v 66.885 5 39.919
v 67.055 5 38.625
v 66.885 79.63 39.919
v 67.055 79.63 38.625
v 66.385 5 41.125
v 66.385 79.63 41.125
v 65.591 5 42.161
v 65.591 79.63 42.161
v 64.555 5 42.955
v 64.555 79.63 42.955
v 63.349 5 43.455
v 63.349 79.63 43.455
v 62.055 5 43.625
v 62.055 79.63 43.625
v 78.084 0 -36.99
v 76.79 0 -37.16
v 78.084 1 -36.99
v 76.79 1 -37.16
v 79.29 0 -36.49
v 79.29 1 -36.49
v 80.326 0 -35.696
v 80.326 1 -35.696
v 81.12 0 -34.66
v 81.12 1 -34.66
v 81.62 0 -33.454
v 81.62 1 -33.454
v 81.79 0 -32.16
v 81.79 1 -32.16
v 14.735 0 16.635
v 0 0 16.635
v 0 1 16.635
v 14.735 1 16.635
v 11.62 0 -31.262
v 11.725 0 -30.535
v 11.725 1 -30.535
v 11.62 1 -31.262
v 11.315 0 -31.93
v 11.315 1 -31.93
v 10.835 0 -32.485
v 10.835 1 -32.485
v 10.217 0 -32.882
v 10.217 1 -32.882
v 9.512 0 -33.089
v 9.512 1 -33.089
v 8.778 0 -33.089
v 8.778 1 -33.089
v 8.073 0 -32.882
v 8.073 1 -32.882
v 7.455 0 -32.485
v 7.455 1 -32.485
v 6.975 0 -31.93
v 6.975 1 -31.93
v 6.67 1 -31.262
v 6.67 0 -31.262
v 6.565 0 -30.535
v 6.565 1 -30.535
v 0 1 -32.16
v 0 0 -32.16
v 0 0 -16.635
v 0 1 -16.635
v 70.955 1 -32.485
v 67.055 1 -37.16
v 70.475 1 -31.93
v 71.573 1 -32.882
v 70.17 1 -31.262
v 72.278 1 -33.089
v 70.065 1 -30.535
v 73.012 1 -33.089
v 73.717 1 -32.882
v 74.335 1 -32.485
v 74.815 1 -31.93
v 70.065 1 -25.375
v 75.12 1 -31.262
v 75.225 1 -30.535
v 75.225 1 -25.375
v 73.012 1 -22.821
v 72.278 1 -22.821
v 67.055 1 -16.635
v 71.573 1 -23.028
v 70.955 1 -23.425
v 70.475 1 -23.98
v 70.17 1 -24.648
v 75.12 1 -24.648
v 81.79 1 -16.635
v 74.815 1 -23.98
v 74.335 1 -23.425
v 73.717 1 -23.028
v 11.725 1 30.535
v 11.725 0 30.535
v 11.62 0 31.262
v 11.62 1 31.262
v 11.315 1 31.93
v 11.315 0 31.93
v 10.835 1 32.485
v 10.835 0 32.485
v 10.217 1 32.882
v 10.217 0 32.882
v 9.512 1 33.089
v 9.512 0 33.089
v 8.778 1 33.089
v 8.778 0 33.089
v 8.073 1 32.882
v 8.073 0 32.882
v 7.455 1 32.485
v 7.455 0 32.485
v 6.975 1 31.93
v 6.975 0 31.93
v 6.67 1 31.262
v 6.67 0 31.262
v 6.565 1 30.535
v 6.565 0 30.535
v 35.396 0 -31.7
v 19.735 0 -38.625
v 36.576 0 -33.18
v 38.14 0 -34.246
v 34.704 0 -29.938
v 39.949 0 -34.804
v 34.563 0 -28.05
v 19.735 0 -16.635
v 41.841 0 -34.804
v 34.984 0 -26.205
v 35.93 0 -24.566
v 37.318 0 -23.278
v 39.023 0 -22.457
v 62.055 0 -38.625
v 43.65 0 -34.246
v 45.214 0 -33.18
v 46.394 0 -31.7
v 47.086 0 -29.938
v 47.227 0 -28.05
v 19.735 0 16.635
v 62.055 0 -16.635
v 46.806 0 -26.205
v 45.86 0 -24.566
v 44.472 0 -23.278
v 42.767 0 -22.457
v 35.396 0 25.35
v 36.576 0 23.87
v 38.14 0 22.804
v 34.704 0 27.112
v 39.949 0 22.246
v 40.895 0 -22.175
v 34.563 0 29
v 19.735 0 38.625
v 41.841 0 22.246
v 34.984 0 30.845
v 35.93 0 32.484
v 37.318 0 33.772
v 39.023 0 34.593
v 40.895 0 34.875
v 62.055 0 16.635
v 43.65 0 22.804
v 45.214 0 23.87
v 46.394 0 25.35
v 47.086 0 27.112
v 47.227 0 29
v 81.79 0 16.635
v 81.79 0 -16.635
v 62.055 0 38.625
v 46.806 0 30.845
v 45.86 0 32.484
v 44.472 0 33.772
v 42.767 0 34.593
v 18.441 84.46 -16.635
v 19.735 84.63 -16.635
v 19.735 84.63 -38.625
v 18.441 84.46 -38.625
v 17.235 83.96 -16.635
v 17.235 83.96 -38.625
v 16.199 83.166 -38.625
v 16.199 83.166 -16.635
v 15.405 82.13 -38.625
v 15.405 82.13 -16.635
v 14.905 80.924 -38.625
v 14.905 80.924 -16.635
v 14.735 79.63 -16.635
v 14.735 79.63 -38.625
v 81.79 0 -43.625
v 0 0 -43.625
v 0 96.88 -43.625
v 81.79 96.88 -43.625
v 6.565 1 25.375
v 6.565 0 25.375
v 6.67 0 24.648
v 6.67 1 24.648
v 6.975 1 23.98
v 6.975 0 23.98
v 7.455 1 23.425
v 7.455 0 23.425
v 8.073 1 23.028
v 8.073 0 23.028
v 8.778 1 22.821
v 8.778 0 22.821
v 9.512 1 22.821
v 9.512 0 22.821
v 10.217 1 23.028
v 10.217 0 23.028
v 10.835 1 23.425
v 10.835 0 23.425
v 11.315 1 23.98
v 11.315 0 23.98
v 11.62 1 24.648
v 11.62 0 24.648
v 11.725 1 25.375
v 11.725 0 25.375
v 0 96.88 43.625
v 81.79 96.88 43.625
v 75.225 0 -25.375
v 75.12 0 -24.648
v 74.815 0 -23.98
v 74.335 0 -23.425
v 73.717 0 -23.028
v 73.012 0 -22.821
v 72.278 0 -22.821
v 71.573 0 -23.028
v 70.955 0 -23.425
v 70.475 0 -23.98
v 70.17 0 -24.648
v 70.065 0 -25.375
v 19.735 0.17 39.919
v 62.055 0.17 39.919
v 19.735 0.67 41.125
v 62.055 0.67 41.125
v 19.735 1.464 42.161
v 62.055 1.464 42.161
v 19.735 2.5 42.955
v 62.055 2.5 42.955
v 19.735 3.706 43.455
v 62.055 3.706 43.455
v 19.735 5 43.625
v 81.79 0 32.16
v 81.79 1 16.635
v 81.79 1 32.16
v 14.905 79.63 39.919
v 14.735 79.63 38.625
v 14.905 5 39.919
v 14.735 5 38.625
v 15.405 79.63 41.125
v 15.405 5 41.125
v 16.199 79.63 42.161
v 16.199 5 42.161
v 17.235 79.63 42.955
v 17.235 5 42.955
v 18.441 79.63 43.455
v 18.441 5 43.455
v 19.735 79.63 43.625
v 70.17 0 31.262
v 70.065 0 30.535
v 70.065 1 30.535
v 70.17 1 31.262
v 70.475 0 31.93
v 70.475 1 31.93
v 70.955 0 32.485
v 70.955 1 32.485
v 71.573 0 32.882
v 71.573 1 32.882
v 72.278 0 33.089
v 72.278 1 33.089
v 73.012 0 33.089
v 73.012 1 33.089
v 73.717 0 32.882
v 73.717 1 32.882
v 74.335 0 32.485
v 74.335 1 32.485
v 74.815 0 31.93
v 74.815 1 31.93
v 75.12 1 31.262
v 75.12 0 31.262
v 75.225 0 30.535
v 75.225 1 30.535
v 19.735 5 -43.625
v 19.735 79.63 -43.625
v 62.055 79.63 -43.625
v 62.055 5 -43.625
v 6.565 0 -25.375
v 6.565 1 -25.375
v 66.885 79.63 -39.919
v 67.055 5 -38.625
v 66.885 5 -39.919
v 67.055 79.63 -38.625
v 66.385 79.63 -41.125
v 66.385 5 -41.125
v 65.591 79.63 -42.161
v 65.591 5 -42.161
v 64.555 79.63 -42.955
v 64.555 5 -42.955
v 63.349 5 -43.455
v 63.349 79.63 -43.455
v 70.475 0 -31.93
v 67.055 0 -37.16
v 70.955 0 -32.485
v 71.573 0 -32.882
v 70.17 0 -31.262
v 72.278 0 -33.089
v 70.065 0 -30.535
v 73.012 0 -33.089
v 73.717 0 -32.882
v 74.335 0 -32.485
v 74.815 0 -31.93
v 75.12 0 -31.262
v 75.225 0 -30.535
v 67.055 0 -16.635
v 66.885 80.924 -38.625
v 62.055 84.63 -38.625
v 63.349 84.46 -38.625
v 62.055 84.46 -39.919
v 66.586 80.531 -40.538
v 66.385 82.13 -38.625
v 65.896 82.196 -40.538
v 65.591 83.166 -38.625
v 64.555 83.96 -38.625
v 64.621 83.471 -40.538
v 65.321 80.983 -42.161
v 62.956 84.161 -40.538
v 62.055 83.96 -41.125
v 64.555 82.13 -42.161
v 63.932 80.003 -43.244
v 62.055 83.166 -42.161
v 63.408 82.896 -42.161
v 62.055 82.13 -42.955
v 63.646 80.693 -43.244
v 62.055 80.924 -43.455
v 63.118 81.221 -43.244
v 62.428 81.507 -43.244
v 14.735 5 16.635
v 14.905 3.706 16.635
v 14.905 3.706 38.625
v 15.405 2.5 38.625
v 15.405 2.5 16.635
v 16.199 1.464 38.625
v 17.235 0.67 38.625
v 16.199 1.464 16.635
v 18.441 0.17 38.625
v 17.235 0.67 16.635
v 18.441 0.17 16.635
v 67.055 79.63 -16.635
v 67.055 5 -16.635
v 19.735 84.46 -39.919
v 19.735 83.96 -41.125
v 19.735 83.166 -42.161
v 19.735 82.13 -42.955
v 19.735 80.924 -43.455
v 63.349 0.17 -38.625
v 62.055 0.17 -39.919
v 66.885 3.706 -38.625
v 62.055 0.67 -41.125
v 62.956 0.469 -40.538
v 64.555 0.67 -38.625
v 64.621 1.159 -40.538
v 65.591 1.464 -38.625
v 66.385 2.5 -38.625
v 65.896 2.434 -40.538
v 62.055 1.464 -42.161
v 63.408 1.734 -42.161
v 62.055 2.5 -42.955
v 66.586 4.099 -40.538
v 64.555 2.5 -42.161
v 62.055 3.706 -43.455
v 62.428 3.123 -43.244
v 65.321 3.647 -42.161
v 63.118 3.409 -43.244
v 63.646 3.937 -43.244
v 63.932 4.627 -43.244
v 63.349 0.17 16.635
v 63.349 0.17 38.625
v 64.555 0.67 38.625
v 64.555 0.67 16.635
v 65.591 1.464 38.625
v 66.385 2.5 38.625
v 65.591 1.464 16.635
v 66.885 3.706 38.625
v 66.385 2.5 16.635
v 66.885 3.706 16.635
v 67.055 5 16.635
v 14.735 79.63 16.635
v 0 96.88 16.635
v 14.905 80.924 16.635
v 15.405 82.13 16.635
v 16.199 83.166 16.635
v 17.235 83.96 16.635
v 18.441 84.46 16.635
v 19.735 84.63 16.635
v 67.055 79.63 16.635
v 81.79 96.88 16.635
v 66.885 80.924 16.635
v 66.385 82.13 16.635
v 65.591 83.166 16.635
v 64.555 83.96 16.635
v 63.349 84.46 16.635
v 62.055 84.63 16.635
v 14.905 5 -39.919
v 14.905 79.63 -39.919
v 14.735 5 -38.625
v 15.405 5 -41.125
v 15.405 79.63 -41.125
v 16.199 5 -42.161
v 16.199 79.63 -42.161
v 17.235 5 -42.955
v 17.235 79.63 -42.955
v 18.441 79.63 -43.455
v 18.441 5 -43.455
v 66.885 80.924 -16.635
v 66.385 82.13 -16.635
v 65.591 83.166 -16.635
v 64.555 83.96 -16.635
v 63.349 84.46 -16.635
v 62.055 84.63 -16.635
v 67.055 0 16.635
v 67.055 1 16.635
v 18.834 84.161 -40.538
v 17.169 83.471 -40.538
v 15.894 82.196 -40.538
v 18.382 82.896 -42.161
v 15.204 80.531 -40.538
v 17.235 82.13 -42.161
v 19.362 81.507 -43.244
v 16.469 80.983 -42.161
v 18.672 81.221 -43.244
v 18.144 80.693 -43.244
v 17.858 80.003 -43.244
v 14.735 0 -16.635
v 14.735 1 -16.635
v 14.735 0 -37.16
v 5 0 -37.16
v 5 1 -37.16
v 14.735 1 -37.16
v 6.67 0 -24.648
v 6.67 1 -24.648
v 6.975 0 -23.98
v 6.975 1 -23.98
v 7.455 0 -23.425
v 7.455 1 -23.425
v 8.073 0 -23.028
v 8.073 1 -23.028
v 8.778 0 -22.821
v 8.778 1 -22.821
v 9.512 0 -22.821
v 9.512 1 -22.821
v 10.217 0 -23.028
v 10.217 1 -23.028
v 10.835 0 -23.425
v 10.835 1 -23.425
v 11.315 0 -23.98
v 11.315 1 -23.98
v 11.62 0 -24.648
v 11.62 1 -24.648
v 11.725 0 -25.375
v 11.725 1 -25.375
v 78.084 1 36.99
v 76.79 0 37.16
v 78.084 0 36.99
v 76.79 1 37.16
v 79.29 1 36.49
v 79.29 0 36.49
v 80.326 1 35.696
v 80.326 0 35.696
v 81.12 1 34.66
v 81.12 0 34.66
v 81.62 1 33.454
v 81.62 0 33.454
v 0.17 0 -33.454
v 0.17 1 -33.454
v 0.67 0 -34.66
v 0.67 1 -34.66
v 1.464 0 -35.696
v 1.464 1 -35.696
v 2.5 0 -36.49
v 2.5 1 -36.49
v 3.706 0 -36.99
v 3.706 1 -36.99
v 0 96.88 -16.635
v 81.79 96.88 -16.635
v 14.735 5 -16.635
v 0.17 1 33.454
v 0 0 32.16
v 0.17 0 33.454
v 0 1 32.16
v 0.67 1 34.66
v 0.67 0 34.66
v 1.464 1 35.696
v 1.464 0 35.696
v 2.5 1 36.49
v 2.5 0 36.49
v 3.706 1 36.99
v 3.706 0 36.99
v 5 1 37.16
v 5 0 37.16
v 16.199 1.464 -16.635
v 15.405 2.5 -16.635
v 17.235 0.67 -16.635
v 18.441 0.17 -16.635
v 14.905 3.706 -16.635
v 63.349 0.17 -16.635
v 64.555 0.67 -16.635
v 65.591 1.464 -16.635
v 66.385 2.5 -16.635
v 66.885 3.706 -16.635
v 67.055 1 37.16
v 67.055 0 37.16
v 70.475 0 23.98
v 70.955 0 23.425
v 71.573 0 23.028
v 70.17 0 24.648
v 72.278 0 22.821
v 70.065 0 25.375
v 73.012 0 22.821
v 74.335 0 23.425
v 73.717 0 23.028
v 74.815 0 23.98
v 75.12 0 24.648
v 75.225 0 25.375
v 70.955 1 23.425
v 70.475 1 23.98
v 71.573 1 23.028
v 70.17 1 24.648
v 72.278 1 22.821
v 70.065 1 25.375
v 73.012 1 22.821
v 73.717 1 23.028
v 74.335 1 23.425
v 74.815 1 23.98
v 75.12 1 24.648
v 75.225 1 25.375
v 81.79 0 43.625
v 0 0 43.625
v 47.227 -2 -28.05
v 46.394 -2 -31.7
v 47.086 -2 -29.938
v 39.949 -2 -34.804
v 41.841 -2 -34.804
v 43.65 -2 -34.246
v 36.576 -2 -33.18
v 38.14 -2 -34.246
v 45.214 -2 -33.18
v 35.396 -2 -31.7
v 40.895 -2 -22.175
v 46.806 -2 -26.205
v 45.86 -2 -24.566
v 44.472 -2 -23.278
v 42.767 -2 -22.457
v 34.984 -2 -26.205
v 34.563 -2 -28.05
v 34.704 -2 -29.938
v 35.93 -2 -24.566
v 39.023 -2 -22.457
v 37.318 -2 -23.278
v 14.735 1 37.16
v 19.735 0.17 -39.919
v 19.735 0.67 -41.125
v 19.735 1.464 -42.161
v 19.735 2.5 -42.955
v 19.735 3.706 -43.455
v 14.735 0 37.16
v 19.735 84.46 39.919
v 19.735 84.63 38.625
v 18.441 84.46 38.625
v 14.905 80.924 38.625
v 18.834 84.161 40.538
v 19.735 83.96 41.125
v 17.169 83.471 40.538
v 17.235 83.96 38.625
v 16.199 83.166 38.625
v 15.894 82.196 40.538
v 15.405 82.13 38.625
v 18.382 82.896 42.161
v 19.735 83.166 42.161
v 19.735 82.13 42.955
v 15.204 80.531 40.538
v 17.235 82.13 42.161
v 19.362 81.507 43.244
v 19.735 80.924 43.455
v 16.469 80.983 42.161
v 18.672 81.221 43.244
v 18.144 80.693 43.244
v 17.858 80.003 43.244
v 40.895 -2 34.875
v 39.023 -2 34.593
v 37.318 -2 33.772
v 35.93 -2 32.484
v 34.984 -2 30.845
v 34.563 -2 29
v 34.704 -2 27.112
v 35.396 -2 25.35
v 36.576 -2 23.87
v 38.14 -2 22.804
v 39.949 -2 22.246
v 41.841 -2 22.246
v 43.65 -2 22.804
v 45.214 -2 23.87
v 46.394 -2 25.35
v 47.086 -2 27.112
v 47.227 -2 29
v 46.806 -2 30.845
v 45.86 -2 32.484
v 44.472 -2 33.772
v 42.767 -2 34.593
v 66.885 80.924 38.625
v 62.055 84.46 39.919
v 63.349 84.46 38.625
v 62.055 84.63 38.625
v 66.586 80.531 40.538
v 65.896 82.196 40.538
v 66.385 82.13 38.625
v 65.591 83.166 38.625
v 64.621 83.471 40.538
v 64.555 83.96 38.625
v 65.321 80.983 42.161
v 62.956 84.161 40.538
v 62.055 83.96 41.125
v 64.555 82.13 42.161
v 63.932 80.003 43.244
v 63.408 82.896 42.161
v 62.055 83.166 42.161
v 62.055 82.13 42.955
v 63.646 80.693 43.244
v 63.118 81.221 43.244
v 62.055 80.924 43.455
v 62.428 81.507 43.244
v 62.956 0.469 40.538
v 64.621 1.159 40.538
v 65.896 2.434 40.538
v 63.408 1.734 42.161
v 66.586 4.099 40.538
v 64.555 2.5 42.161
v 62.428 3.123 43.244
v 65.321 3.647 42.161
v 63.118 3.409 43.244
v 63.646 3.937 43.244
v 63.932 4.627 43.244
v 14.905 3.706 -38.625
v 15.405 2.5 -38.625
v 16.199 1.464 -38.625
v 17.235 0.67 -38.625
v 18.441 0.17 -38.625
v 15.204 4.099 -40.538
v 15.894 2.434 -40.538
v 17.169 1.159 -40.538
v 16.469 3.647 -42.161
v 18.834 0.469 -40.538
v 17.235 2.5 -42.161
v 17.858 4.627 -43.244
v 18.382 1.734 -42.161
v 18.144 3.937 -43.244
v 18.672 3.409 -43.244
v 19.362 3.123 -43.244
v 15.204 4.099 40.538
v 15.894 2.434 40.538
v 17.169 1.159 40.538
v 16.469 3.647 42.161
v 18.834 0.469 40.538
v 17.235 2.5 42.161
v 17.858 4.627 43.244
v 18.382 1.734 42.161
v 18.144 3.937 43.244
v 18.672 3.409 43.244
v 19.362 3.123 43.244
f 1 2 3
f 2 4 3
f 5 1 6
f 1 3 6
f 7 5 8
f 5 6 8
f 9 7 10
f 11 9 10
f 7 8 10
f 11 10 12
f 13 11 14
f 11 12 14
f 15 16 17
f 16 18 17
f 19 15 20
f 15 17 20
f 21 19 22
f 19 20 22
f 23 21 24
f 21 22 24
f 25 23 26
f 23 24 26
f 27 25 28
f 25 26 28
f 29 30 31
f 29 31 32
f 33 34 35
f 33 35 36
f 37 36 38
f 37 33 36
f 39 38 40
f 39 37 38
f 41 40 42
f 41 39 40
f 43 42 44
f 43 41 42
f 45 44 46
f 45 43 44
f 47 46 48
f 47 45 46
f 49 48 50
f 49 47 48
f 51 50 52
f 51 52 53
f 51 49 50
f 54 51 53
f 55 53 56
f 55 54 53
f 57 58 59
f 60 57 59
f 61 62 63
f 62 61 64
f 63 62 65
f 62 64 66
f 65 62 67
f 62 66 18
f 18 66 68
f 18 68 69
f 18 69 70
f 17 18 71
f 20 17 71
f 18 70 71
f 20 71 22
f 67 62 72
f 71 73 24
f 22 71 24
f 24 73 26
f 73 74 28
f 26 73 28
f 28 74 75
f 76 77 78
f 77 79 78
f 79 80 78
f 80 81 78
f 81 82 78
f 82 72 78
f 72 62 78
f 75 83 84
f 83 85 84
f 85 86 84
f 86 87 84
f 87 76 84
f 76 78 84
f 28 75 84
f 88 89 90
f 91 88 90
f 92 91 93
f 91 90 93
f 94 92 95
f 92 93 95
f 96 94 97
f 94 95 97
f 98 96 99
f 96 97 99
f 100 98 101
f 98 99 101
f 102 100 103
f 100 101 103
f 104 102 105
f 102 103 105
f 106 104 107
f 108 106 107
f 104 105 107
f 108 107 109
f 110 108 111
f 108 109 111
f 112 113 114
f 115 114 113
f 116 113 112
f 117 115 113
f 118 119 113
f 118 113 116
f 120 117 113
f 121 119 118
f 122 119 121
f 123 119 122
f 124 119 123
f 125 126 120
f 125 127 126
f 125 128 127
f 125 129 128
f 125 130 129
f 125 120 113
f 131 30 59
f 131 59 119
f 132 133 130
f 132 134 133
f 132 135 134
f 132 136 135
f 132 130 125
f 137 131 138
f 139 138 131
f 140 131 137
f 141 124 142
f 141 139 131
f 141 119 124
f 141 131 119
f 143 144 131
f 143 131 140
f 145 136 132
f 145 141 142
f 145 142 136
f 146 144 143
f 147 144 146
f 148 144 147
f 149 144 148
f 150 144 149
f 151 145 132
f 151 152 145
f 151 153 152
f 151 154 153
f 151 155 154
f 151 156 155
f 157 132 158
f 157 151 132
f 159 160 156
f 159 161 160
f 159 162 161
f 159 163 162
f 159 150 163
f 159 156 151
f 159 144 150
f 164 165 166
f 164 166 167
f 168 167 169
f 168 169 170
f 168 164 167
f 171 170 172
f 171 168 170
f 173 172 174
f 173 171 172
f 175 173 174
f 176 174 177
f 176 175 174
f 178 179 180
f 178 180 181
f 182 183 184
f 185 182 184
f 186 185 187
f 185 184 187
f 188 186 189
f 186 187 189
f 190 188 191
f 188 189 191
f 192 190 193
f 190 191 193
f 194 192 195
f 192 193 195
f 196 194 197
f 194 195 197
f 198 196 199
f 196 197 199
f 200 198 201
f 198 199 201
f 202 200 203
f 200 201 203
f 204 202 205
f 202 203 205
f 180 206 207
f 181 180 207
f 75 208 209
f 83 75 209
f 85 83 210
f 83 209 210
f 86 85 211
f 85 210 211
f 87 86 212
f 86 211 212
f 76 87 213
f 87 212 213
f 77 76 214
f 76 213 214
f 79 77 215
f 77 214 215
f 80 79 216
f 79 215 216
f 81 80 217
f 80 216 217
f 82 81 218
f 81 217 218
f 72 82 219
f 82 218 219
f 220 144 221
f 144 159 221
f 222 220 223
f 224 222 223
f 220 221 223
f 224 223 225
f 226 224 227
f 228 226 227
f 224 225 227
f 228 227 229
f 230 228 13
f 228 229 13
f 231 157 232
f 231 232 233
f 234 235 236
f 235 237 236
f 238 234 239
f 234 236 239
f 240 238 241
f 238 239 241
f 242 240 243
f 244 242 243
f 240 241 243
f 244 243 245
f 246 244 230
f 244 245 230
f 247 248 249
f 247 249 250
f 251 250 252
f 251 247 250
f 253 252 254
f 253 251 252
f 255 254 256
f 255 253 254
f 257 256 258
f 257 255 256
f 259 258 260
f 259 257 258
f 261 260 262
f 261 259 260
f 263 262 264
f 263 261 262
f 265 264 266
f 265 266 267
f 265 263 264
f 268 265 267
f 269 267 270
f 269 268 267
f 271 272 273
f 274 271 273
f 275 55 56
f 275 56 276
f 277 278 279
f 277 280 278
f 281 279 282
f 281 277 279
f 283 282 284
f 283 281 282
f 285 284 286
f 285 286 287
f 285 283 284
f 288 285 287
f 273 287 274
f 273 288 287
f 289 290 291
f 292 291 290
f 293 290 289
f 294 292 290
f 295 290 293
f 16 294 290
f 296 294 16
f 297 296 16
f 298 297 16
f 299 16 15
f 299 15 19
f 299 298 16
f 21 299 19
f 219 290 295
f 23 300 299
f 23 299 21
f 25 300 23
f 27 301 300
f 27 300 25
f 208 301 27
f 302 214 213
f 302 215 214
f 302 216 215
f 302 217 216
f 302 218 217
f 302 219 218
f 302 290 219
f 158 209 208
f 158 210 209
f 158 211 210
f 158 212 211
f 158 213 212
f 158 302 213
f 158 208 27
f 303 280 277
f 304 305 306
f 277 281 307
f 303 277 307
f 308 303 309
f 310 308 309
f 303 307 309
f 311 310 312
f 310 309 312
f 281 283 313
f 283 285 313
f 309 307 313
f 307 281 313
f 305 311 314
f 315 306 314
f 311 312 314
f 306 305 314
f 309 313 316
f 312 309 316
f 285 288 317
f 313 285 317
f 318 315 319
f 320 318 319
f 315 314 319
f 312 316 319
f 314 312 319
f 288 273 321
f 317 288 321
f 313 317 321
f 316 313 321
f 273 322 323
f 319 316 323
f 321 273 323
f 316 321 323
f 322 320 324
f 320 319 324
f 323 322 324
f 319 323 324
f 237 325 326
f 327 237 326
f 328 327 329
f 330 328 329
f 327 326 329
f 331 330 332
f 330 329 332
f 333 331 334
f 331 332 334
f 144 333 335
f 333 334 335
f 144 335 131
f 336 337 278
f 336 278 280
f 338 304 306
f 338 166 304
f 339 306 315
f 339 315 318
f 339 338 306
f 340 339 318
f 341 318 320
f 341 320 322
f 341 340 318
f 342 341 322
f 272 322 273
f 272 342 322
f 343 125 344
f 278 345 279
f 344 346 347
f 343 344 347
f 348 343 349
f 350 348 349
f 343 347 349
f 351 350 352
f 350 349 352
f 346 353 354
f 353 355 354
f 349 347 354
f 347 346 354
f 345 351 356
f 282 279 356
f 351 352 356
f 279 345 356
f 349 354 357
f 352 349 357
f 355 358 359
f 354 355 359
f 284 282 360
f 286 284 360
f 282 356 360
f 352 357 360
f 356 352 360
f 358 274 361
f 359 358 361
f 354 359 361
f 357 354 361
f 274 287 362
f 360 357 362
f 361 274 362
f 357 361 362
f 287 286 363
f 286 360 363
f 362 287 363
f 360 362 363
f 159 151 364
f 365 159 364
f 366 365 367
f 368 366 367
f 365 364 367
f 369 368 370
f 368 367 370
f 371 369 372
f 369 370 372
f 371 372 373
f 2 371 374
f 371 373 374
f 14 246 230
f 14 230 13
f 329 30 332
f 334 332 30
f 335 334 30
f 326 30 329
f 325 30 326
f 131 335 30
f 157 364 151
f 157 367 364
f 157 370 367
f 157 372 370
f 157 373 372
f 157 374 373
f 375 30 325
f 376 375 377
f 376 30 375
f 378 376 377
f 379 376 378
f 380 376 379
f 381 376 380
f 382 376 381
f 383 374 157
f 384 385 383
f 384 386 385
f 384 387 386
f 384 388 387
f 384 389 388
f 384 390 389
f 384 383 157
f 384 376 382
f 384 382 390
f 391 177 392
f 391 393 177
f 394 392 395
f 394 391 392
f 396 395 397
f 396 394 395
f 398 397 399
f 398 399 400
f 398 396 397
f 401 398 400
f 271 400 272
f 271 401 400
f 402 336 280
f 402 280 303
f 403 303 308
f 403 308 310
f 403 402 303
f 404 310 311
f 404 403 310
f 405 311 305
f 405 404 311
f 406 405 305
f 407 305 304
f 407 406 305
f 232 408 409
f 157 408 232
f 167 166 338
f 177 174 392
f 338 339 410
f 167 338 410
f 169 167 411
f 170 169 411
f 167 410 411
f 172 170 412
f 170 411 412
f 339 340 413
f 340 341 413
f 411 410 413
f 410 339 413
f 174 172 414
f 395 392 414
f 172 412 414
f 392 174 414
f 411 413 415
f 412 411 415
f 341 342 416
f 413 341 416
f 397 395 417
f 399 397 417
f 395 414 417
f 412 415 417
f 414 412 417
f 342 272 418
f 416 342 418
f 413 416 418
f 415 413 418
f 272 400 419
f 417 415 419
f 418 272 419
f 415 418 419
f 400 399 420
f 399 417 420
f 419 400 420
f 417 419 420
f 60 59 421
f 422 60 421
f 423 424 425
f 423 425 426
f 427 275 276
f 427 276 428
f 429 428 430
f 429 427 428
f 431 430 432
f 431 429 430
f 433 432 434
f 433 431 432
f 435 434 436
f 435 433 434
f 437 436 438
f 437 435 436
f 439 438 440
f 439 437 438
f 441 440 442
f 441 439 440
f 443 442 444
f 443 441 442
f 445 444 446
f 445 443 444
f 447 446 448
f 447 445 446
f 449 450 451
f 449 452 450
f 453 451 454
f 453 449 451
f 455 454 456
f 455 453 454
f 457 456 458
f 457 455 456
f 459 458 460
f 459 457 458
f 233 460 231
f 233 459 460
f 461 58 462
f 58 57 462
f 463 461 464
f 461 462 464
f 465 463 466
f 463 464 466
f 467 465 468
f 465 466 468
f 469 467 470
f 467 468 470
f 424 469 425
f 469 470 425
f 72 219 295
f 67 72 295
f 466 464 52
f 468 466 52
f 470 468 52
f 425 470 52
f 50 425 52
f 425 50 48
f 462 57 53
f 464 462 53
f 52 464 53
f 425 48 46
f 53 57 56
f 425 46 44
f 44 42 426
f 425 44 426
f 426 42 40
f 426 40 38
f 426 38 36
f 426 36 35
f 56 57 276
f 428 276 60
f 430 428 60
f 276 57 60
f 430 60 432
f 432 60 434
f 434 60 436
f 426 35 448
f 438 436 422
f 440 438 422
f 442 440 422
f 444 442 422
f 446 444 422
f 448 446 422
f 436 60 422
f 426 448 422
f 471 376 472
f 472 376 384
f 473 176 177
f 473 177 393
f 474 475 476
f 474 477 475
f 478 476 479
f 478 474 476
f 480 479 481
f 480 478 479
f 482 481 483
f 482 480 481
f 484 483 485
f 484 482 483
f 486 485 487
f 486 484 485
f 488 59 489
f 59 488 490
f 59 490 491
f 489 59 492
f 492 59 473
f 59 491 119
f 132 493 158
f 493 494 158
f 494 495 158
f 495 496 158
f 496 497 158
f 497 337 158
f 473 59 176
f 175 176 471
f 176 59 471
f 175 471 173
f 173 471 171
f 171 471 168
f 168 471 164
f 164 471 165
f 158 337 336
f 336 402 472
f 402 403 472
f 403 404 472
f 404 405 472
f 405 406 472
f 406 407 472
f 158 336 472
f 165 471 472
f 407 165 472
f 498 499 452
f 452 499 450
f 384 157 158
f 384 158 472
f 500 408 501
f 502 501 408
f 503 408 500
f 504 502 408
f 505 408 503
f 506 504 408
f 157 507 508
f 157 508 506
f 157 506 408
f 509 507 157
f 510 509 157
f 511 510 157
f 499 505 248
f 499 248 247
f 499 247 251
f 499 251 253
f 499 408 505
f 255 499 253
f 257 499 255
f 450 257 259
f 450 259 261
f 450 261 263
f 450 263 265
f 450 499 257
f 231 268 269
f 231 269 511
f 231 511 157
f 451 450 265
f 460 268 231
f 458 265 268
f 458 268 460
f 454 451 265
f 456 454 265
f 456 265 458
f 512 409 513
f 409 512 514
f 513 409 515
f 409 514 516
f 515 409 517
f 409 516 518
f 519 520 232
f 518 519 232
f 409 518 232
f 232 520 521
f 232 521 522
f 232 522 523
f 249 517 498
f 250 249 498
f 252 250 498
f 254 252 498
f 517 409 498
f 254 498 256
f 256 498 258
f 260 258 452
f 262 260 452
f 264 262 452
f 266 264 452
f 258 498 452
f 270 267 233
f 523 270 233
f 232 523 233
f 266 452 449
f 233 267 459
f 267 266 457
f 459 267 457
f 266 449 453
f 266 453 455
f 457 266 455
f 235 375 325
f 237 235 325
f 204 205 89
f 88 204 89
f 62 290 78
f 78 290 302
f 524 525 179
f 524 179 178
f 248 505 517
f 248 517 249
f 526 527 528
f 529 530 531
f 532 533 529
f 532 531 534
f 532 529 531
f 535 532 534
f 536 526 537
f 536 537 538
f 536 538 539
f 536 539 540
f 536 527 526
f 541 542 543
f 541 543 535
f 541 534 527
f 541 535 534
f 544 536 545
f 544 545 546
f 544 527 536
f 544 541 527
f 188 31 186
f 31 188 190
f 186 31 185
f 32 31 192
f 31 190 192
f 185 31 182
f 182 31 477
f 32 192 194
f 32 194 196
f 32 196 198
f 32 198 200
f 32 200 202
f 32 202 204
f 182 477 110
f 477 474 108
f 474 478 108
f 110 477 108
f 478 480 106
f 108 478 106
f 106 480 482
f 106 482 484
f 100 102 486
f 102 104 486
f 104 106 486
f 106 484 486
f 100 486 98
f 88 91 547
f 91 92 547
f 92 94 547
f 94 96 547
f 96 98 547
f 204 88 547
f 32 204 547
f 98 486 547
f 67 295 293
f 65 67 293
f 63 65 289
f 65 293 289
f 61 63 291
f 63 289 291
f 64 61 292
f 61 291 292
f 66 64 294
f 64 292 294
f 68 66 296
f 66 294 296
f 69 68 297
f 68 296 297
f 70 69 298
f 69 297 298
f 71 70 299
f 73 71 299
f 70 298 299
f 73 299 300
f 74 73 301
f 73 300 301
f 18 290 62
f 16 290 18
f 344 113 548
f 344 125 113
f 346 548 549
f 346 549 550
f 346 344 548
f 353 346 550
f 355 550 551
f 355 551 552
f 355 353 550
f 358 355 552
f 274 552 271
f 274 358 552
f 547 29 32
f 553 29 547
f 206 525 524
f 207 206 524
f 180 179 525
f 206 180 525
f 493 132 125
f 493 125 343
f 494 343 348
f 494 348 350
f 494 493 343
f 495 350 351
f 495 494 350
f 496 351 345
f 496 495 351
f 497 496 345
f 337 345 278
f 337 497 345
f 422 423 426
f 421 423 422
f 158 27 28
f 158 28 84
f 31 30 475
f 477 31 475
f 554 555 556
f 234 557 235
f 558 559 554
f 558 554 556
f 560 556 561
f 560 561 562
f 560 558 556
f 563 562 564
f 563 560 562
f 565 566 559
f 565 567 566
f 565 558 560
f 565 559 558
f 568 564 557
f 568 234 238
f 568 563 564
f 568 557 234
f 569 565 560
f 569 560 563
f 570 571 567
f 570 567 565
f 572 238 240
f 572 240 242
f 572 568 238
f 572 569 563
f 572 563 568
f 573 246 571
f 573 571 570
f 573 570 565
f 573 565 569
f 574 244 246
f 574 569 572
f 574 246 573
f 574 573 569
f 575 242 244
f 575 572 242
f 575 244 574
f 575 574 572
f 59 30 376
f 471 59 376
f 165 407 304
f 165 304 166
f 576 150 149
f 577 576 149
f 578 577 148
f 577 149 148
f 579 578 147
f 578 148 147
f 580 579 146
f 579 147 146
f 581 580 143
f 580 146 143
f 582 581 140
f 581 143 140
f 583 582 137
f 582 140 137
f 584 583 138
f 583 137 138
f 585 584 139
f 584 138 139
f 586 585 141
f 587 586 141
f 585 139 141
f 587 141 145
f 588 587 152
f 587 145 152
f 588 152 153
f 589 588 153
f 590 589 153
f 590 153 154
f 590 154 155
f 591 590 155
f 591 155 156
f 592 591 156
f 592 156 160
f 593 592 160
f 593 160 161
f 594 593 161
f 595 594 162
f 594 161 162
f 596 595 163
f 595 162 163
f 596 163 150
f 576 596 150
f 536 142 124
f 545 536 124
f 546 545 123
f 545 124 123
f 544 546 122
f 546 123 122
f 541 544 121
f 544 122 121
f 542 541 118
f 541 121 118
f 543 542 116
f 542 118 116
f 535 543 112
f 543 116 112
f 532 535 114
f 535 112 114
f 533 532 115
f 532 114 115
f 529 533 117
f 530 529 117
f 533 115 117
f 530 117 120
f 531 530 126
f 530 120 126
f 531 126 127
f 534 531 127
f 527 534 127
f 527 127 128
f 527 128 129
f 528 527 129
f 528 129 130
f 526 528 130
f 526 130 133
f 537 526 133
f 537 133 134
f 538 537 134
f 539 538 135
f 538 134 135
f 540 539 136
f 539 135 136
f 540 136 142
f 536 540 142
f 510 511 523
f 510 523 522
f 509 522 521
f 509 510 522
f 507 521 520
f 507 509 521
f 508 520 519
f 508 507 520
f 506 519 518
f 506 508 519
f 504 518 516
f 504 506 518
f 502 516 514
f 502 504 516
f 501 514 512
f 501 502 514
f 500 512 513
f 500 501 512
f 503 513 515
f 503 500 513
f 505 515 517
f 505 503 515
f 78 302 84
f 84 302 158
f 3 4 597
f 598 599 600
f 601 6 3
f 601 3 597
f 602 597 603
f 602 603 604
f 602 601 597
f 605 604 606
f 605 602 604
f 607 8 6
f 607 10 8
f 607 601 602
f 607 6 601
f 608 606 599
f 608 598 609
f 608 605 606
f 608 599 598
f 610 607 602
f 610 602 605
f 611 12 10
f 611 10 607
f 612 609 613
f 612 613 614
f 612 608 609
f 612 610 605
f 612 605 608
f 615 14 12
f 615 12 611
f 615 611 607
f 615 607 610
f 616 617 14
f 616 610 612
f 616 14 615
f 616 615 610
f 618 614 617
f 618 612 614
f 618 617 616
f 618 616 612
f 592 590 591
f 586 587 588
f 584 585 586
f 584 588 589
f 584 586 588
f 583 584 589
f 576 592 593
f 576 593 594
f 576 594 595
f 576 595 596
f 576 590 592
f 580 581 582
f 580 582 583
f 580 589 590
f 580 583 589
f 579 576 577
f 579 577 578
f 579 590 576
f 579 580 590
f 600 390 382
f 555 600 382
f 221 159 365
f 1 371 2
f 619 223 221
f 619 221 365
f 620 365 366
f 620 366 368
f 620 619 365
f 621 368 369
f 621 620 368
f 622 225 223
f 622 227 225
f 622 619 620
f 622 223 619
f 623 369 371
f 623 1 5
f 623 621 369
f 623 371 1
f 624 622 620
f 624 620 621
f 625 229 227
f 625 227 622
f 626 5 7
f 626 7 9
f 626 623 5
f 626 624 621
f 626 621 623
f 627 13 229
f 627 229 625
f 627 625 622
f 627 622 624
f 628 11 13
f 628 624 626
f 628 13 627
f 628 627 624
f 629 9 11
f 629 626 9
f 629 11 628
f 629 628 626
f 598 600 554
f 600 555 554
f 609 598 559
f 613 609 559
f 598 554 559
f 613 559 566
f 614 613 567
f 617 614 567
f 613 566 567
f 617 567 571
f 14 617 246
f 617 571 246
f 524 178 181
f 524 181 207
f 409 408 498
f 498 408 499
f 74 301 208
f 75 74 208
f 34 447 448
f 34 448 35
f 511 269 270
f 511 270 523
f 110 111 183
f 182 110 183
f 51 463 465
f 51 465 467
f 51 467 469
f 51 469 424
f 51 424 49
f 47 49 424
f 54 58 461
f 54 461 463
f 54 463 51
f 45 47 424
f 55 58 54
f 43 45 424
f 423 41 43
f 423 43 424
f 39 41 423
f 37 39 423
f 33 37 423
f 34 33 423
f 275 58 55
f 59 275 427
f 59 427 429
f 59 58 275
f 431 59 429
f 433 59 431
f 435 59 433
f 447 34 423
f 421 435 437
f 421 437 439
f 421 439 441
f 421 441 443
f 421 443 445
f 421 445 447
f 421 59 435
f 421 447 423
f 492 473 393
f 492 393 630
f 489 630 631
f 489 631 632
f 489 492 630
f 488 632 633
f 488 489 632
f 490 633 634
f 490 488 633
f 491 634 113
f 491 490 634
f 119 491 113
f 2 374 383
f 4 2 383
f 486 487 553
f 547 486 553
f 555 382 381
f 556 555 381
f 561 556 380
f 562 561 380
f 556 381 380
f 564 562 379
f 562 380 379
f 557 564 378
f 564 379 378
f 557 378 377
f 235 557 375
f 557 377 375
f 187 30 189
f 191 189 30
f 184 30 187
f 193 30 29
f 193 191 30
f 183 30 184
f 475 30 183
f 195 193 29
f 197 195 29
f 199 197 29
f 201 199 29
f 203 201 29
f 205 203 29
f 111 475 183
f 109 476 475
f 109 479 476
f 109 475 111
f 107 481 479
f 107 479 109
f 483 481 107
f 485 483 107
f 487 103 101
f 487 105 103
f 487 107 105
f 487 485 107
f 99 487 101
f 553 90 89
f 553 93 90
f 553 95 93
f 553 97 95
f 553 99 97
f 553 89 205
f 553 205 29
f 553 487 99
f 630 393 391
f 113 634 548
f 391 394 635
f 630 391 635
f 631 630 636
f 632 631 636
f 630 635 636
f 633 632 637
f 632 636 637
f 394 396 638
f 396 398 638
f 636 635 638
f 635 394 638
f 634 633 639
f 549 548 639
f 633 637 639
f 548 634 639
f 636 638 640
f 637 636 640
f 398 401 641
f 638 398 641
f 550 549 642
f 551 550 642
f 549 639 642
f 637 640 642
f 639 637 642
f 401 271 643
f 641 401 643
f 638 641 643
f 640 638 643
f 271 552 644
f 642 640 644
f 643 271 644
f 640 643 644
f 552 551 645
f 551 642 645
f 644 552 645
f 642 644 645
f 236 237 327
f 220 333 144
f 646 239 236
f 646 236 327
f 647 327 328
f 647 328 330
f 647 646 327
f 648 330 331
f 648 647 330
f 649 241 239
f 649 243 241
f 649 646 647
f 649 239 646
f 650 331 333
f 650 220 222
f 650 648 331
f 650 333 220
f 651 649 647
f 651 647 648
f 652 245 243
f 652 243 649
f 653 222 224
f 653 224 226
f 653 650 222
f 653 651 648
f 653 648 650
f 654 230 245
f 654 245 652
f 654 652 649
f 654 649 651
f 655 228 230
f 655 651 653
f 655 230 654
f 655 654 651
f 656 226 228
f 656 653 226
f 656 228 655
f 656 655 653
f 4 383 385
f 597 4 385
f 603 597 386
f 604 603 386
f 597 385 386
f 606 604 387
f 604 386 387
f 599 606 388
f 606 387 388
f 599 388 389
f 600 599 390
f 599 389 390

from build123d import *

# Parameters (mm, degrees)
SKETCH1_W             = 81.79
SKETCH1_H             = 96.88
BOSS_EXTRUDE1_DEPTH   = 16.635
BOSS_EXTRUDE2_DEPTH   = 26.99
FILLET1_R             = 5
FILLET1_OF_MIRROR1_R  = 5
SKETCH3_W             = 14.735
SKETCH3_H             = 20.525
BOSS_EXTRUDE3_DEPTH   = 1
BOSS_EXTRUDE3_2_DEPTH = 1
BOSS_EXTRUDE3_3_DEPTH = 1
BOSS_EXTRUDE3_4_DEPTH = 1
FILLET2_R             = 5
FILLET3_R             = 5
FILLET4_R             = 5
FILLET5_R             = 5
SKETCH4_W             = 81.79
SKETCH4_H             = 87.25
BOSS_EXTRUDE4_DEPTH   = 96.88
SKETCH6_R             = 6.35
BOSS_EXTRUDE5_DEPTH   = 2


with BuildPart() as part:
    # Sketch1 → Boss-Extrude1 (new, symmetric)
    with BuildSketch(Plane.XY):
        with Locations((40.895, 48.44)):
            Rectangle(SKETCH1_W, SKETCH1_H)
    extrude(amount=BOSS_EXTRUDE1_DEPTH, both=True)

    # Sketch2 → Boss-Extrude2 (add)
    with BuildSketch(Plane.XY.offset(16.635)):
        with BuildLine():
            Line((19.735, 0), (62.055, 0))
            ThreePointArc((62.055, 0), (65.590533906, 1.464466094), (67.055, 5))
            Line((67.055, 5), (67.055, 79.63))
            ThreePointArc((67.055, 79.63), (65.590533906, 83.165533906), (62.055, 84.63))
            Line((62.055, 84.63), (19.735, 84.63))
            ThreePointArc((19.735, 84.63), (16.199466094, 83.165533906), (14.735, 79.63))
            Line((14.735, 79.63), (14.735, 5))
            ThreePointArc((14.735, 5), (16.199466094, 1.464466094), (19.735, 0))
        make_face()
    boss_extrude2 = extrude(amount=BOSS_EXTRUDE2_DEPTH)

    # Fillet1
    fillet1_edges = [part.edges().sort_by_distance(p)[0] for p in [
        (65.590533906, 1.464466094, 43.625),
        (67.055, 42.315, 43.625),
        (65.590533906, 83.165533906, 43.625),
        (40.895, 84.63, 43.625),
        (16.199466094, 83.165533906, 43.625),
        (14.735, 42.315, 43.625),
        (16.199466094, 1.464466094, 43.625),
        (40.895, 0, 43.625),
    ]]
    fillet(fillet1_edges, radius=FILLET1_R)

    # Mirror1: Boss-Extrude2 across plane
    add(boss_extrude2.mirror(Plane.XY))

    # Fillet1 of Mirror1
    fillet1_of_mirror1_edges = [part.edges().sort_by_distance(p)[0] for p in [
        (65.590533906, 1.464466094, -43.625),
        (67.055, 42.315, -43.625),
        (65.590533906, 83.165533906, -43.625),
        (40.895, 84.63, -43.625),
        (16.199466094, 83.165533906, -43.625),
        (14.735, 42.315, -43.625),
        (16.199466094, 1.464466094, -43.625),
        (40.895, 0, -43.625),
    ]]
    fillet(fillet1_of_mirror1_edges, radius=FILLET1_OF_MIRROR1_R)

    # Sketch6 → Boss-Extrude5 (add)
    with BuildSketch(Plane.XZ):
        with Locations(Location((40.895, 28.525, 0), (0, 0, 90))):
            Circle(SKETCH6_R)
        with Locations(Location((40.895, -28.525, 0), (0, 0, 90))):
            Circle(SKETCH6_R)
    extrude(amount=BOSS_EXTRUDE5_DEPTH)


with BuildPart() as body_2:
    # Sketch3 → Boss-Extrude3 (new body)
    with BuildSketch(Plane.XZ):
        with Locations((7.3675, 26.8975)):
            Rectangle(SKETCH3_W, SKETCH3_H)
        with BuildLine():
            Line((6.565, 30.535), (6.565, 25.375))
            ThreePointArc((6.565, 25.375), (9.145, 22.795), (11.725, 25.375))
            Line((11.725, 25.375), (11.725, 30.535))
            ThreePointArc((11.725, 30.535), (9.145, 33.115), (6.565, 30.535))
        make_face(mode=Mode.SUBTRACT)
    extrude(amount=-BOSS_EXTRUDE3_DEPTH)

    # Fillet4
    fillet4_edges = [body_2.edges().sort_by_distance(p)[0] for p in [
        (0, 0.5, 37.16),
    ]]
    fillet(fillet4_edges, radius=FILLET4_R)


with BuildPart() as body_3:
    # Sketch3 → Boss-Extrude3 2 (new body)
    with BuildSketch(Plane.XZ):
        with Locations((7.3675, -26.8975)):
            Rectangle(SKETCH3_W, SKETCH3_H)
        with BuildLine():
            Line((6.565, -30.535), (6.565, -25.375))
            ThreePointArc((6.565, -25.375), (9.145, -22.795), (11.725, -25.375))
            Line((11.725, -25.375), (11.725, -30.535))
            ThreePointArc((11.725, -30.535), (9.145, -33.115), (6.565, -30.535))
        make_face(mode=Mode.SUBTRACT)
    extrude(amount=-BOSS_EXTRUDE3_2_DEPTH)

    # Fillet5
    fillet5_edges = [body_3.edges().sort_by_distance(p)[0] for p in [
        (0, 0.5, -37.16),
    ]]
    fillet(fillet5_edges, radius=FILLET5_R)


with BuildPart() as body_4:
    # Sketch3 → Boss-Extrude3 3 (new body)
    with BuildSketch(Plane.XZ):
        with Locations((74.4225, -26.8975)):
            Rectangle(SKETCH3_W, SKETCH3_H)
        with BuildLine():
            Line((70.065, -25.375), (70.065, -30.535))
            ThreePointArc((70.065, -30.535), (72.645, -33.115), (75.225, -30.535))
            Line((75.225, -30.535), (75.225, -25.375))
            ThreePointArc((75.225, -25.375), (72.645, -22.795), (70.065, -25.375))
        make_face(mode=Mode.SUBTRACT)
    extrude(amount=-BOSS_EXTRUDE3_3_DEPTH)

    # Fillet3
    fillet3_edges = [body_4.edges().sort_by_distance(p)[0] for p in [
        (81.79, 0.5, -37.16),
    ]]
    fillet(fillet3_edges, radius=FILLET3_R)


with BuildPart() as body_5:
    # Sketch3 → Boss-Extrude3 4 (new body)
    with BuildSketch(Plane.XZ):
        with Locations((74.4225, 26.8975)):
            Rectangle(SKETCH3_W, SKETCH3_H)
        with BuildLine():
            Line((70.065, 25.375), (70.065, 30.535))
            ThreePointArc((70.065, 30.535), (72.645, 33.115), (75.225, 30.535))
            Line((75.225, 30.535), (75.225, 25.375))
            ThreePointArc((75.225, 25.375), (72.645, 22.795), (70.065, 25.375))
        make_face(mode=Mode.SUBTRACT)
    extrude(amount=-BOSS_EXTRUDE3_4_DEPTH)

    # Fillet2
    fillet2_edges = [body_5.edges().sort_by_distance(p)[0] for p in [
        (81.79, 0.5, 37.16),
    ]]
    fillet(fillet2_edges, radius=FILLET2_R)


with BuildPart() as body_6:
    # Sketch4 → Boss-Extrude4 (new body)
    with BuildSketch(Plane.XZ):
        with Locations((40.895, 0)):
            Rectangle(SKETCH4_W, SKETCH4_H)
    extrude(amount=-BOSS_EXTRUDE4_DEPTH)


solid = Compound([part.part, body_2.part, body_3.part, body_4.part, body_5.part, body_6.part])
